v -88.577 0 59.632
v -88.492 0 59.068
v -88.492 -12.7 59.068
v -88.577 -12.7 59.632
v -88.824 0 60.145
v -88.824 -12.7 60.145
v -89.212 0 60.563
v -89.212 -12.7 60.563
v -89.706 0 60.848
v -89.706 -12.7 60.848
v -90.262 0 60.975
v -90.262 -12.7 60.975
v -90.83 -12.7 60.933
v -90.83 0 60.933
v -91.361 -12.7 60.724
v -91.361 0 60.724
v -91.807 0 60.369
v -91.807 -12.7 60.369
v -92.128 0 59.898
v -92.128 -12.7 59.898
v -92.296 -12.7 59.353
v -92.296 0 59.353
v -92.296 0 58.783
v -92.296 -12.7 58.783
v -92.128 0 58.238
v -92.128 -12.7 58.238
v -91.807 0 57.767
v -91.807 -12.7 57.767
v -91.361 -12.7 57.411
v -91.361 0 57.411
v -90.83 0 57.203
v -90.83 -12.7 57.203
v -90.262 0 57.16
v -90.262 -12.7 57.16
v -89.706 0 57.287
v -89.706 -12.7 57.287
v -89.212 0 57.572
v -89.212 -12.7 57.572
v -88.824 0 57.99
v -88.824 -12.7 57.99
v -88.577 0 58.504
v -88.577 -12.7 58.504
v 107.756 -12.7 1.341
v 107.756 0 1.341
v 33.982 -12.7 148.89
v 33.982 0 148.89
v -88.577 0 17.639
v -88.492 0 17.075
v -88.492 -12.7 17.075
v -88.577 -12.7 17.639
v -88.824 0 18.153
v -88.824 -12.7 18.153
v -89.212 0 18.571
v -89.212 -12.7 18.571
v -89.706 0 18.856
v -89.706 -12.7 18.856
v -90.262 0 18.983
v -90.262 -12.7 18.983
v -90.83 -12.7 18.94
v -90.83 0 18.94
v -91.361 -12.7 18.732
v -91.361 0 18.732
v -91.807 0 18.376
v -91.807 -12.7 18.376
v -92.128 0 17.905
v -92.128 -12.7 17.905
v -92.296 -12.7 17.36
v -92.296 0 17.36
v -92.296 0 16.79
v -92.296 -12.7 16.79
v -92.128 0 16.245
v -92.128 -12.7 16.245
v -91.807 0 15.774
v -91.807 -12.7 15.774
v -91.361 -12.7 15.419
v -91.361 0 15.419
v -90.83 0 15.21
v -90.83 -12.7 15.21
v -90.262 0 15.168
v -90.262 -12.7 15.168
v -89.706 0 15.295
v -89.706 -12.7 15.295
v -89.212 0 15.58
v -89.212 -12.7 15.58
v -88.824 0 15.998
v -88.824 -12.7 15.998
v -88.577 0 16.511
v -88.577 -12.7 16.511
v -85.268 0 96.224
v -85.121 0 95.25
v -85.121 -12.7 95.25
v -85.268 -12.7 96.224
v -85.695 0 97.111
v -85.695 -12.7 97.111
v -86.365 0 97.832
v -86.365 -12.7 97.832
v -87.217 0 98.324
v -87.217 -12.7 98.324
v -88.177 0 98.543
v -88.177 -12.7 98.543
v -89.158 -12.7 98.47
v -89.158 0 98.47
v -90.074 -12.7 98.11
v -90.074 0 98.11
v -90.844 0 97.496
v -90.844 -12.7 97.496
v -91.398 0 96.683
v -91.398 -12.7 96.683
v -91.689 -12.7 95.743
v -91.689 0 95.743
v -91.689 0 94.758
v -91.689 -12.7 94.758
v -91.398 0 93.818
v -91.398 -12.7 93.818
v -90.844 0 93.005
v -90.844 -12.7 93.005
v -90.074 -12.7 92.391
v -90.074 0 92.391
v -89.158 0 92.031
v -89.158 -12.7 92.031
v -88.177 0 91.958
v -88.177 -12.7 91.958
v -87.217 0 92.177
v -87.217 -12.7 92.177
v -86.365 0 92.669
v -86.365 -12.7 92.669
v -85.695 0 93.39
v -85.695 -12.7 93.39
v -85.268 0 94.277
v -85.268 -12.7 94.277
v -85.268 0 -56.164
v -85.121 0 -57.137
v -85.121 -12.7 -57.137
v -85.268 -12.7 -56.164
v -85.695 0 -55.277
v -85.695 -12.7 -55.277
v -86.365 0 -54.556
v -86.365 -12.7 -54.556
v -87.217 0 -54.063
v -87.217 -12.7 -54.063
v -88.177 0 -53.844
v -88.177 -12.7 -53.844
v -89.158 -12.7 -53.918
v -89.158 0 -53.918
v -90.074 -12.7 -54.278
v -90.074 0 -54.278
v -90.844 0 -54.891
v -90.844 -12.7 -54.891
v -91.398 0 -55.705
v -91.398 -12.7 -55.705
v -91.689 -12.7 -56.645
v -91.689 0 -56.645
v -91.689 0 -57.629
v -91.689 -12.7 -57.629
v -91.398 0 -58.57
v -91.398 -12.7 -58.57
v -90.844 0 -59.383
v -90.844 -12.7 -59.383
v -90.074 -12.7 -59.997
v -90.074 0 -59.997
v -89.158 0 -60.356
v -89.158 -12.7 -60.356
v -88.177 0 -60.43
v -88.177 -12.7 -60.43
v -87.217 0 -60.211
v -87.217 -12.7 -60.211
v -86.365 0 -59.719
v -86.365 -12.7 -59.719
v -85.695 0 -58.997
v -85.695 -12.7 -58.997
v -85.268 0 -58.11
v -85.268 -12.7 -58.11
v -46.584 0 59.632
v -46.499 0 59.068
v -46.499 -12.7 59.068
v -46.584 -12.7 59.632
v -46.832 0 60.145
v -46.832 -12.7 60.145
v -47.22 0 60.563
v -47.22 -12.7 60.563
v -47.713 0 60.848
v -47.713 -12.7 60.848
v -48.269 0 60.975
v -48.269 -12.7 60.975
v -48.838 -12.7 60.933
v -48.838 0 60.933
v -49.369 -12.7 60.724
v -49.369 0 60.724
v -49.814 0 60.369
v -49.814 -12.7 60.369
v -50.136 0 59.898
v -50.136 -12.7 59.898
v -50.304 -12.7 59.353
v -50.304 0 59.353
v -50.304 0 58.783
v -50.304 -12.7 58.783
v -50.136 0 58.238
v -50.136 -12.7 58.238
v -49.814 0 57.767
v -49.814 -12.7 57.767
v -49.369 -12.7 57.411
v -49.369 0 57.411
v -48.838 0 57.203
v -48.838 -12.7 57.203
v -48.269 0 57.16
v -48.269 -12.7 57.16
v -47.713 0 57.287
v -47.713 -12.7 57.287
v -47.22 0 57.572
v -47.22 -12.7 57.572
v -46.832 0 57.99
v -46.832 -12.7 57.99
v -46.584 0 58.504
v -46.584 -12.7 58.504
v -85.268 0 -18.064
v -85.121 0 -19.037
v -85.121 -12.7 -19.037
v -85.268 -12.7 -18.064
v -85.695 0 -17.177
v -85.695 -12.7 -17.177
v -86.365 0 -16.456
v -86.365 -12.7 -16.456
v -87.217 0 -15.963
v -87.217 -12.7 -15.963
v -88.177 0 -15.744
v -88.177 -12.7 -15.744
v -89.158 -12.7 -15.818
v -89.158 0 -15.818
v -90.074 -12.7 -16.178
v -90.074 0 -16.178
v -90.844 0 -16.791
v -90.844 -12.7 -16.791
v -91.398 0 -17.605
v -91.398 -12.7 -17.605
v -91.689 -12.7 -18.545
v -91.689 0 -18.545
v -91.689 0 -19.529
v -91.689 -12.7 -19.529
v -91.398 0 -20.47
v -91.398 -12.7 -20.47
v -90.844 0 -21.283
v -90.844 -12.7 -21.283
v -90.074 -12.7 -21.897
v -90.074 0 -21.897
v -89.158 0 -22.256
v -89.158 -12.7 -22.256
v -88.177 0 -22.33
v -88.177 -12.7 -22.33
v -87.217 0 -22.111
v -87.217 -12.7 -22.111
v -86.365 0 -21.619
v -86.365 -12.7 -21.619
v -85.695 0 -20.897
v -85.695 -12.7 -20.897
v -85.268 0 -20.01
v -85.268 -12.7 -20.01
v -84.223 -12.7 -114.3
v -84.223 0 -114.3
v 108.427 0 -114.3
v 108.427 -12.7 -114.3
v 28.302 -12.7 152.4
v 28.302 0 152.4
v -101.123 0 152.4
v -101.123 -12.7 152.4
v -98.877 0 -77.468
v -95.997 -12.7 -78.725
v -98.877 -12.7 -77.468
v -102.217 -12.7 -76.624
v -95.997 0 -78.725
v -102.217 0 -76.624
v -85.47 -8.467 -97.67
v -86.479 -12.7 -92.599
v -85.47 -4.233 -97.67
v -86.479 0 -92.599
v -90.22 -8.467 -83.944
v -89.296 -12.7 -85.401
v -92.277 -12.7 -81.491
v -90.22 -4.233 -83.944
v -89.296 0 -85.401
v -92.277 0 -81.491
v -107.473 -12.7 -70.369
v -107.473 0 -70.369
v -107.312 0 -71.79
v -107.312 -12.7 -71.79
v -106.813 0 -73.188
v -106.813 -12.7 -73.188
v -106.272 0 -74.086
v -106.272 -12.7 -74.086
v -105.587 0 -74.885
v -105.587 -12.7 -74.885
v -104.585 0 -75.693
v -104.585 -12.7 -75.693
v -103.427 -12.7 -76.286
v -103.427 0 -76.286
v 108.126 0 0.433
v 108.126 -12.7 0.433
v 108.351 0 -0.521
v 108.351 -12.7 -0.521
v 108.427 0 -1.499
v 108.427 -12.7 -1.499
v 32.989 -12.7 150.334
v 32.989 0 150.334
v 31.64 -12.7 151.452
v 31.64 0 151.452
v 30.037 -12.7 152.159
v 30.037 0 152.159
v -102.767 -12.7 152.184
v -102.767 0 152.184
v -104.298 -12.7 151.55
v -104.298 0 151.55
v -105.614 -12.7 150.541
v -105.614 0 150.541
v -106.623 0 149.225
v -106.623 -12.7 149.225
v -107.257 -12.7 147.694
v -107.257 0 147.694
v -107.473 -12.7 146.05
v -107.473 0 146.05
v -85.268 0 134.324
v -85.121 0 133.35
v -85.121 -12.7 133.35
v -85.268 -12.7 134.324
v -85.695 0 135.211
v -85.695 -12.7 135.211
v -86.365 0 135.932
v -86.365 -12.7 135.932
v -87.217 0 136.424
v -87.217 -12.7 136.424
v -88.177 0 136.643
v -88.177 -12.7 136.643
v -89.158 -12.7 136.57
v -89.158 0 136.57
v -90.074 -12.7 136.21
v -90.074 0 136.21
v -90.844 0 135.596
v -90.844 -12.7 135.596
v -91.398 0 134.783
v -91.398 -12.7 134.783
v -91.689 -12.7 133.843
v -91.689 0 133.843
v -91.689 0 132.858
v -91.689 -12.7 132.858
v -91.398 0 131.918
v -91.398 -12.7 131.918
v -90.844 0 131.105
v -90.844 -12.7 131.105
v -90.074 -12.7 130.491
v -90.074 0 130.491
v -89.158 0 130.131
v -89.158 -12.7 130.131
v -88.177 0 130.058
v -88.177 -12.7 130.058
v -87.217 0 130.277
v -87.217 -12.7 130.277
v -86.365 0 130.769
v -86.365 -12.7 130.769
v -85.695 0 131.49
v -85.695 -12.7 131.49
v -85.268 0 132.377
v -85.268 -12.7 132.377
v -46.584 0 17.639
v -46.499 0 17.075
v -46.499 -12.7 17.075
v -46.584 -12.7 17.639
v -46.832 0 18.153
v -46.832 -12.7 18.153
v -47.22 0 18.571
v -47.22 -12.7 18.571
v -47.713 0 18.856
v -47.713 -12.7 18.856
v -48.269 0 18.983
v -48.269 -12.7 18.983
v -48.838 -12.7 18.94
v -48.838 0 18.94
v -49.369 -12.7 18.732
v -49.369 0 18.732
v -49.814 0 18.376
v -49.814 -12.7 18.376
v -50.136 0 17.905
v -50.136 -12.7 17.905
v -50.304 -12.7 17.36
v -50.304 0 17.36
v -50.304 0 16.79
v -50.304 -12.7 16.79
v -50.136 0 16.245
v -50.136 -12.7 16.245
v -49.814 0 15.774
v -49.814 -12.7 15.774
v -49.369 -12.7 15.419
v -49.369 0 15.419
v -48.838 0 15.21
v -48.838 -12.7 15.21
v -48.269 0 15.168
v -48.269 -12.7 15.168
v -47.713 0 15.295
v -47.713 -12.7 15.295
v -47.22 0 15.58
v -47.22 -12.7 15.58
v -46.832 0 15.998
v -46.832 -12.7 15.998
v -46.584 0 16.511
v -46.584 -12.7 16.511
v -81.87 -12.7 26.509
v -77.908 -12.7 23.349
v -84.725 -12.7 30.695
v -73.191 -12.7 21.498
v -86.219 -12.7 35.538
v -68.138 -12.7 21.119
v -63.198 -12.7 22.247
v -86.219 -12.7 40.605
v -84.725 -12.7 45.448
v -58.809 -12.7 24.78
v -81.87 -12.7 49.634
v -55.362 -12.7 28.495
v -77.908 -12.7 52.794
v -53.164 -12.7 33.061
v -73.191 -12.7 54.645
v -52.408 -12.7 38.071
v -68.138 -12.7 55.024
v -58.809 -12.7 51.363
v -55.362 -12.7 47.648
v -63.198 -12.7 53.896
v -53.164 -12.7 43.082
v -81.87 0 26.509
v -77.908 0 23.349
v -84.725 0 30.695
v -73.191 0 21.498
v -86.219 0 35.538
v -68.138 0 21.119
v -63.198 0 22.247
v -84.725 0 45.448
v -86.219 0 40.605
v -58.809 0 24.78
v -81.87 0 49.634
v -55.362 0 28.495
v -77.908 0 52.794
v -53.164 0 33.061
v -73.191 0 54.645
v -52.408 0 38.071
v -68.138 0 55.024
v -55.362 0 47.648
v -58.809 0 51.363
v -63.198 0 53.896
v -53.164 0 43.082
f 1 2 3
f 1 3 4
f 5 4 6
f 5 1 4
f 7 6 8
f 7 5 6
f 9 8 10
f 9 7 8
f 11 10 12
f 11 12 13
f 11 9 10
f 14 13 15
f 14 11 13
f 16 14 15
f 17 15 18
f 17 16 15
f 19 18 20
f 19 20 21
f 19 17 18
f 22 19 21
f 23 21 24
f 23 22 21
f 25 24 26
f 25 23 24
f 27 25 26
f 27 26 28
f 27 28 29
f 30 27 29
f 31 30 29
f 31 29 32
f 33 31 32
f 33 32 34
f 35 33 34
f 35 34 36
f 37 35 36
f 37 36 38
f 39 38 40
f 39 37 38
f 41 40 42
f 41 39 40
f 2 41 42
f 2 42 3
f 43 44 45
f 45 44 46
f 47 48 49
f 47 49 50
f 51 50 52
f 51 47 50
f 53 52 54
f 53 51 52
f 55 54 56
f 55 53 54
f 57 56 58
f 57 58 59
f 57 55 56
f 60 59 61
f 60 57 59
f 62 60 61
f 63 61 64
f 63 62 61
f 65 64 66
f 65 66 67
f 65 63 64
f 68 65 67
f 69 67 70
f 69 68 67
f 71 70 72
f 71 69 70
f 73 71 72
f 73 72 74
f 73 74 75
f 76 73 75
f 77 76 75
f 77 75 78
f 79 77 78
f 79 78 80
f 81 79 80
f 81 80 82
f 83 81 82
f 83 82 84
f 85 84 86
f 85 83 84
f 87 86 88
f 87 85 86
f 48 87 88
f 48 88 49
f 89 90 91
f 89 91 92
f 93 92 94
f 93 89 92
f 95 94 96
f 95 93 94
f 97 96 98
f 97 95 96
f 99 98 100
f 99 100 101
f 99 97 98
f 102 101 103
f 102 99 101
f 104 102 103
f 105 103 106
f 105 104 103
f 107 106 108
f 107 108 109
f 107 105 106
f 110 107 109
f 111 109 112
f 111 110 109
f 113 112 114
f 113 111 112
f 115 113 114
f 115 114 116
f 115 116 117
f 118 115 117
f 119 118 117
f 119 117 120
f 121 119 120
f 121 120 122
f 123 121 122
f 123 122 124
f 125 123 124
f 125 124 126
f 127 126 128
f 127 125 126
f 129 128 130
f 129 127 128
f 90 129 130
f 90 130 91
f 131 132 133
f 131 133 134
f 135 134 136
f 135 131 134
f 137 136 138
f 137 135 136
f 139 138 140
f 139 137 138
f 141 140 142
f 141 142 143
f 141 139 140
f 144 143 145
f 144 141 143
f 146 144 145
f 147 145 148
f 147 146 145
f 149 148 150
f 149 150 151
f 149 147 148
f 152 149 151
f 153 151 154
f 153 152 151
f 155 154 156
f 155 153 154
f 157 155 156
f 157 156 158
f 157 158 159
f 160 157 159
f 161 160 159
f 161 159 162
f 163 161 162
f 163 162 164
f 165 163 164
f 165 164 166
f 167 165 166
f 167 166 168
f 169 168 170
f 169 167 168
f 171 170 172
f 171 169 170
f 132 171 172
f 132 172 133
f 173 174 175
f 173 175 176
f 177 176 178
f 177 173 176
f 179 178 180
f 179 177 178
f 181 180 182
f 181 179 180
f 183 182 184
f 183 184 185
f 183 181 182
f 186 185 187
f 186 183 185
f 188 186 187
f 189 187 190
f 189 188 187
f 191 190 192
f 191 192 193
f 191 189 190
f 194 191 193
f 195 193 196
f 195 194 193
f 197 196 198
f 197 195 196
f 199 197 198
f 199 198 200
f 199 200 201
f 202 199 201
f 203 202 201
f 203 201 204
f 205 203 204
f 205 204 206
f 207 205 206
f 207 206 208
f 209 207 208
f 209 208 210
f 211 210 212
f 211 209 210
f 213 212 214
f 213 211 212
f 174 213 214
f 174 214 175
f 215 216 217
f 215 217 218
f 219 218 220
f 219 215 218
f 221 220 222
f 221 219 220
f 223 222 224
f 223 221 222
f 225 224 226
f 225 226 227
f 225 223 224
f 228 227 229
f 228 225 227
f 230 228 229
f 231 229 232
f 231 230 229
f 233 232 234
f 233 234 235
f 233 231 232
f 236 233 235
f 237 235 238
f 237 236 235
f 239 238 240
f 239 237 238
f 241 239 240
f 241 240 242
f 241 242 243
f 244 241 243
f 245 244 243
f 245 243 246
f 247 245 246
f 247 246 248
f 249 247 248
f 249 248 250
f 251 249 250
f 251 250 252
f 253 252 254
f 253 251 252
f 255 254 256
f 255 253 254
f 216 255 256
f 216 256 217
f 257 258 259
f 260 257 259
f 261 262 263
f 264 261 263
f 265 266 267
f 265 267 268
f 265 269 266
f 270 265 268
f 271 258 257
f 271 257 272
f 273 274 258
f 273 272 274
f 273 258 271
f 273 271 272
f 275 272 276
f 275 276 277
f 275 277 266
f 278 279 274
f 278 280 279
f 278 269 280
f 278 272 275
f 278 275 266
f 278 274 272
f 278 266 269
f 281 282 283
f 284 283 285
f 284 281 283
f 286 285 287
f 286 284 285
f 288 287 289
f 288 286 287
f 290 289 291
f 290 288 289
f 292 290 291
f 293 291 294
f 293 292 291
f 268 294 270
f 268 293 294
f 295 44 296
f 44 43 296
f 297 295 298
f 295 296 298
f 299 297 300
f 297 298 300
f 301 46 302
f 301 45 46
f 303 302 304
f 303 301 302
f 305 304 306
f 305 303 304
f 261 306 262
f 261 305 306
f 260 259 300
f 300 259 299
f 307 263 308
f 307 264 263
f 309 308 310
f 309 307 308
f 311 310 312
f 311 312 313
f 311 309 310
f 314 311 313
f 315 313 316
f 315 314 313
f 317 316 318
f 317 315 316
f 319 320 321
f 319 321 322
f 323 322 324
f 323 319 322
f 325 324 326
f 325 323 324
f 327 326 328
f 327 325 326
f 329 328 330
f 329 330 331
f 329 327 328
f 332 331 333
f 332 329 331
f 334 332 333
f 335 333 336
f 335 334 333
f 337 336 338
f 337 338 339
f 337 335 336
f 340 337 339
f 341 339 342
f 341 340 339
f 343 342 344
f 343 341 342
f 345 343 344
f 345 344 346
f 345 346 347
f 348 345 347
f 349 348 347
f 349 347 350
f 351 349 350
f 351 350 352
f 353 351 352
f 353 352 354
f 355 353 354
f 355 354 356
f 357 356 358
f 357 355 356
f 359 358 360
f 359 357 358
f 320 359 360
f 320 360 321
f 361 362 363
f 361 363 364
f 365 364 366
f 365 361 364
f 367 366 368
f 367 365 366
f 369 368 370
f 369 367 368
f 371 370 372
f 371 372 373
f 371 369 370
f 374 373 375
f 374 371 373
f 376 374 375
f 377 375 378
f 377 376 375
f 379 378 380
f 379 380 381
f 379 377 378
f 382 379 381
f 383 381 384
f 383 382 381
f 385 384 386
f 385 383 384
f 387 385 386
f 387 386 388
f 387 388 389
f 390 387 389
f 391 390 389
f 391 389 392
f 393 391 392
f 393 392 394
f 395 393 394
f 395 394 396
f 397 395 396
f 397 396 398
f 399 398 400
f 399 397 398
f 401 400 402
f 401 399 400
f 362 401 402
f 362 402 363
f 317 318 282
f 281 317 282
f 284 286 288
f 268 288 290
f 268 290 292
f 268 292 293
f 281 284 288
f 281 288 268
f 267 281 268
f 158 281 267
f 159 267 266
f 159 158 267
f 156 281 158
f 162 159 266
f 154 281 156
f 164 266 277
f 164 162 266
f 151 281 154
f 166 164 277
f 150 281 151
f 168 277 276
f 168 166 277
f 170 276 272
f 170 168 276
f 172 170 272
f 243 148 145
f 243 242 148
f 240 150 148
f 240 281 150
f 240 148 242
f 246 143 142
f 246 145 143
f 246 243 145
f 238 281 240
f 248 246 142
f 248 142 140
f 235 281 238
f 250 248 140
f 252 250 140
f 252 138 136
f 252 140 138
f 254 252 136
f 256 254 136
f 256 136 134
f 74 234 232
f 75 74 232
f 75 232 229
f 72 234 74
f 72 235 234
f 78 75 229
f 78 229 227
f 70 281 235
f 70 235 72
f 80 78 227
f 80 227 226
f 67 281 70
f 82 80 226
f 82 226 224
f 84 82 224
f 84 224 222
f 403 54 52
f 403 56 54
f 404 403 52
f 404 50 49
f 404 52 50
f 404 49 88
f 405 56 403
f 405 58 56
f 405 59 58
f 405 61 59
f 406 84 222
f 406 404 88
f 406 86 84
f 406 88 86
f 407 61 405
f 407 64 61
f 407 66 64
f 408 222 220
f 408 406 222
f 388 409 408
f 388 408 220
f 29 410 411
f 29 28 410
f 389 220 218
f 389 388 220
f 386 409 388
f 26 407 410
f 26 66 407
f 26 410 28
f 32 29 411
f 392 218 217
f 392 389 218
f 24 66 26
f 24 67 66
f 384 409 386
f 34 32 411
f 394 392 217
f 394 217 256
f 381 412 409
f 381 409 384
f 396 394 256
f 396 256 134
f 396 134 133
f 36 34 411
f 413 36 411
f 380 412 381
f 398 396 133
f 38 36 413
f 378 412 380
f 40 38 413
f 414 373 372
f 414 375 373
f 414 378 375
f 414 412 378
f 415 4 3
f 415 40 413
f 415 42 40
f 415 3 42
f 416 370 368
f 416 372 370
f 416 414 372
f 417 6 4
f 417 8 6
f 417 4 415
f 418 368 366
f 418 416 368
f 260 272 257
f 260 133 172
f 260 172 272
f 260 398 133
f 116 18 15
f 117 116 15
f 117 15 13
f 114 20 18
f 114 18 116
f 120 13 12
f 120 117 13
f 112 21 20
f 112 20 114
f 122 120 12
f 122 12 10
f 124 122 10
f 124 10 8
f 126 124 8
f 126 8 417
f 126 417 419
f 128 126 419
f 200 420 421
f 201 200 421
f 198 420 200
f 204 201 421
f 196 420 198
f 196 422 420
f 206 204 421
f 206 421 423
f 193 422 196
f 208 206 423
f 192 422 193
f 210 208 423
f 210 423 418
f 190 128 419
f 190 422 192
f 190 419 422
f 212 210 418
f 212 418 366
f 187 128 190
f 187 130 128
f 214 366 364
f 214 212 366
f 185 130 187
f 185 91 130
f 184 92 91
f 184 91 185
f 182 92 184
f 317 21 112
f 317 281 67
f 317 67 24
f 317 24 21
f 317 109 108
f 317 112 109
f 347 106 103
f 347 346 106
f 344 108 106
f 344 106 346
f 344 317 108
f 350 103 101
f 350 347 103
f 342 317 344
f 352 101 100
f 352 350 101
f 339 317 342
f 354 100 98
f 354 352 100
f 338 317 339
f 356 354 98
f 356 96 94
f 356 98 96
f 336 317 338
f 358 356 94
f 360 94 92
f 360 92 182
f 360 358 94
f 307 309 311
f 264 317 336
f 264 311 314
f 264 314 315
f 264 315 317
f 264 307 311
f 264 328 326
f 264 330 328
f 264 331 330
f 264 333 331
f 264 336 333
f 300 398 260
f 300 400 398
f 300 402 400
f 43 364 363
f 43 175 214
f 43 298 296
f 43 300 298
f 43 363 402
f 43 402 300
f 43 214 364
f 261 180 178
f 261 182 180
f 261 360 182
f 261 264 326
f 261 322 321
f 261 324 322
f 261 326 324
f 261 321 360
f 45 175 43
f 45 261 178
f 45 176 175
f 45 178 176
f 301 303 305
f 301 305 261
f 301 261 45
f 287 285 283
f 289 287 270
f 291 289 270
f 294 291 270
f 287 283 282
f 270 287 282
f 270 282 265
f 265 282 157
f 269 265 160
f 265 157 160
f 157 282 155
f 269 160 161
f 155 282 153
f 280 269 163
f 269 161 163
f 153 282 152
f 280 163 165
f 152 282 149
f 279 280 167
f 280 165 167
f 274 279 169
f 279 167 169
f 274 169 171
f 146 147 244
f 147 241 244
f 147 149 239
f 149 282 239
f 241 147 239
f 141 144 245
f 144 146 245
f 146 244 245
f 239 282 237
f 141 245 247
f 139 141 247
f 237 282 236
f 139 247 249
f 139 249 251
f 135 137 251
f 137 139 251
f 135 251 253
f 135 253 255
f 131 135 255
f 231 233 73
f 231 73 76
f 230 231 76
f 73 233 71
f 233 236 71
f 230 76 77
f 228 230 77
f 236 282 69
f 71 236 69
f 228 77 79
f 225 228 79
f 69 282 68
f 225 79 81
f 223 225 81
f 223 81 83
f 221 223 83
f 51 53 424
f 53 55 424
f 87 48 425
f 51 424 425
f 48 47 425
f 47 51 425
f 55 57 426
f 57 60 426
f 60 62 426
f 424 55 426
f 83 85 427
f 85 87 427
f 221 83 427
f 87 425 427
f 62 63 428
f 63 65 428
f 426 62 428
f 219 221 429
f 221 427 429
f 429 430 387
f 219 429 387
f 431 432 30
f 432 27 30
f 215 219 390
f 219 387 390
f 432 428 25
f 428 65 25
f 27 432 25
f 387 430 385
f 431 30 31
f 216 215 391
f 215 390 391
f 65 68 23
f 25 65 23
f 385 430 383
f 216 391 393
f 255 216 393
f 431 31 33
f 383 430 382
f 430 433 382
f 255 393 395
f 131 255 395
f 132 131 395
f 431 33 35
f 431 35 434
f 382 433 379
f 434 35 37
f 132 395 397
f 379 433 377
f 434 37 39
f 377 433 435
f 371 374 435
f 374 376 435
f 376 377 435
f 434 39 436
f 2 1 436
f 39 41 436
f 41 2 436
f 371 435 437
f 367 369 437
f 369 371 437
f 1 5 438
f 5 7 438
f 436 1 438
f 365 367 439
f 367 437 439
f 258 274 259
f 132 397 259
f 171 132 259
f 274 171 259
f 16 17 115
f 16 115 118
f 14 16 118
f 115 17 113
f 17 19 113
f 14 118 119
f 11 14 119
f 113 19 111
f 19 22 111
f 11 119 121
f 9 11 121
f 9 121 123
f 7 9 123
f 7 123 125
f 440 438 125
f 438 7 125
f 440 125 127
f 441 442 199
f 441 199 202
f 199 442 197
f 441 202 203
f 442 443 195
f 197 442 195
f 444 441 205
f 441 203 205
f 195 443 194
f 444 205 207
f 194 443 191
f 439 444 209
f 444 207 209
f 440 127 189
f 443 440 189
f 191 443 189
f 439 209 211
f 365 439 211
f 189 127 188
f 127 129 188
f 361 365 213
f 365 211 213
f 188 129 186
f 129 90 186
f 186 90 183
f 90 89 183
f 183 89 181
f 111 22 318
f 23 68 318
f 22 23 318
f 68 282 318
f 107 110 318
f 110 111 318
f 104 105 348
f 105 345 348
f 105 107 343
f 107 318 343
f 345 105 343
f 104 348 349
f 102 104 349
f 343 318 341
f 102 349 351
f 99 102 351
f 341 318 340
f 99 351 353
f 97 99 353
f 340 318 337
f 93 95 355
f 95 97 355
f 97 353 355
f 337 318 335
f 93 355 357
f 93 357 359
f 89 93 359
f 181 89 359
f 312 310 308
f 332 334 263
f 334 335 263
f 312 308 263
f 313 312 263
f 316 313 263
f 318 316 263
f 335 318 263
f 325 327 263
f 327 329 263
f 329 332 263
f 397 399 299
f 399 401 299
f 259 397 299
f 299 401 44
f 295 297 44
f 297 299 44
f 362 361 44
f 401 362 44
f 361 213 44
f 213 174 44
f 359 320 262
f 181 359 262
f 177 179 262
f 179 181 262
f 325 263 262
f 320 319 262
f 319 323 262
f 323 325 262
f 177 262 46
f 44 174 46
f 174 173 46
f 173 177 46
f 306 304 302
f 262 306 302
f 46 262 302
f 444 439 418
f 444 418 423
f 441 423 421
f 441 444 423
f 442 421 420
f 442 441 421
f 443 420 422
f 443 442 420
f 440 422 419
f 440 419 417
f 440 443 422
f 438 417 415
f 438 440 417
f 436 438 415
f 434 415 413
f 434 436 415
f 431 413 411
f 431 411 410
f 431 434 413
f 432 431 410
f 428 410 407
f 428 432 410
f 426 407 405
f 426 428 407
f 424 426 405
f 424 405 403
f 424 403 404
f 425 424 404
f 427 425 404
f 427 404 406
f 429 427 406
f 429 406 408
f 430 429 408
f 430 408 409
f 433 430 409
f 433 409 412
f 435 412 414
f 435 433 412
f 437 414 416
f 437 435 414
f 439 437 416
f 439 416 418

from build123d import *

# Parameters (mm, degrees)
F0_R     = 3.302
F0_W     = 52
F0_H     = 52
F0_R_2   = 1.9128263044
F0_R_3   = 17
F1_DEPTH = 12.7
F2_DEPTH = 25.4
F3_R     = 6.35


with BuildPart() as f1:
    # F0 (on Front) → F1 (new body)
    with BuildSketch(Plane.XZ):
        with BuildLine():
            Line((108.4265169831, 0.0004552842), (32.2265169831, 152.4004552842))
            Line((32.2265169831, 152.4004552842), (-107.4734830169, 152.4004552842))
            Line((-107.4734830169, 152.4004552842), (-107.4734830169, -76.1995447158))
            add(Edge.make_bspline(
                [(-84.2229677556, -114.2995447158), (-85.0358593396, -95.7832909802), (-85.4194185281, -76.1871889735), (-107.4734830169, -76.1995447158)],
                knots=[0, 0, 0, 0, 44.6340280494, 44.6340280494, 44.6340280494, 44.6340280494], degree=3))
            Line((-84.2229677556, -114.2995447158), (108.4265169831, -114.2995447158))
            Line((108.4265169831, -114.2995447158), (108.4265169831, 0.0004552842))
        make_face()
        with Locations((-88.4234830169, -57.1371889735)):
            Circle(F0_R, mode=Mode.SUBTRACT)
        with Locations((-88.4234830169, -19.0371889735)):
            Circle(F0_R, mode=Mode.SUBTRACT)
        with Locations((-69.4084768891, 38.0714893565)):
            Rectangle(F0_W, F0_H, mode=Mode.SUBTRACT)
        with Locations((-88.4234830169, 95.2504552842)):
            Circle(F0_R, mode=Mode.SUBTRACT)
        with Locations((-88.4234830169, 133.3504552842)):
            Circle(F0_R, mode=Mode.SUBTRACT)
        with Locations((-69.4084768891, 38.0714893565)):
            Rectangle(F0_W, F0_H)
        with Locations((-90.4046768891, 17.0752893565)):
            Circle(F0_R_2, mode=Mode.SUBTRACT)
        with Locations((-48.4122768891, 17.0752893565)):
            Circle(F0_R_2, mode=Mode.SUBTRACT)
        with Locations((-69.4084763527, 38.0714898929)):
            Circle(F0_R_3, mode=Mode.SUBTRACT)
        with Locations((-90.4046768891, 59.0676893565)):
            Circle(F0_R_2, mode=Mode.SUBTRACT)
        with Locations((-48.4122768891, 59.0676893565)):
            Circle(F0_R_2, mode=Mode.SUBTRACT)
    extrude(amount=F1_DEPTH)

    # F0 (on Front) → F2 (cut)
    with BuildSketch(Plane.XZ):
        with BuildLine():
            Line((108.4265169831, 0.0004552842), (32.2265169831, 152.4004552842))
            Line((32.2265169831, 152.4004552842), (-107.4734830169, 152.4004552842))
            Line((-107.4734830169, 152.4004552842), (-107.4734830169, -76.1995447158))
            add(Edge.make_bspline(
                [(-84.2229677556, -114.2995447158), (-85.0358593396, -95.7832909802), (-85.4194185281, -76.1871889735), (-107.4734830169, -76.1995447158)],
                knots=[0, 0, 0, 0, 44.6340280494, 44.6340280494, 44.6340280494, 44.6340280494], degree=3))
            Line((-84.2229677556, -114.2995447158), (108.4265169831, -114.2995447158))
            Line((108.4265169831, -114.2995447158), (108.4265169831, 0.0004552842))
        make_face()
        with Locations((-88.4234830169, -57.1371889735)):
            Circle(F0_R, mode=Mode.SUBTRACT)
        with Locations((-88.4234830169, -19.0371889735)):
            Circle(F0_R, mode=Mode.SUBTRACT)
        with Locations((-69.4084768891, 38.0714893565)):
            Rectangle(F0_W, F0_H, mode=Mode.SUBTRACT)
        with Locations((-88.4234830169, 95.2504552842)):
            Circle(F0_R, mode=Mode.SUBTRACT)
        with Locations((-88.4234830169, 133.3504552842)):
            Circle(F0_R, mode=Mode.SUBTRACT)
    extrude(amount=-F2_DEPTH, mode=Mode.SUBTRACT)

    # F3
    f3_edges = [f1.edges().sort_by_distance(p)[0] for p in [
        (-107.473483, -6.35, 152.400455),
        (-107.473483, -6.35, -76.199545),
        (108.426517, -6.35, 0.000455),
        (32.226517, -6.35, 152.400455),
    ]]
    fillet(f3_edges, radius=F3_R)


solid = f1.part
